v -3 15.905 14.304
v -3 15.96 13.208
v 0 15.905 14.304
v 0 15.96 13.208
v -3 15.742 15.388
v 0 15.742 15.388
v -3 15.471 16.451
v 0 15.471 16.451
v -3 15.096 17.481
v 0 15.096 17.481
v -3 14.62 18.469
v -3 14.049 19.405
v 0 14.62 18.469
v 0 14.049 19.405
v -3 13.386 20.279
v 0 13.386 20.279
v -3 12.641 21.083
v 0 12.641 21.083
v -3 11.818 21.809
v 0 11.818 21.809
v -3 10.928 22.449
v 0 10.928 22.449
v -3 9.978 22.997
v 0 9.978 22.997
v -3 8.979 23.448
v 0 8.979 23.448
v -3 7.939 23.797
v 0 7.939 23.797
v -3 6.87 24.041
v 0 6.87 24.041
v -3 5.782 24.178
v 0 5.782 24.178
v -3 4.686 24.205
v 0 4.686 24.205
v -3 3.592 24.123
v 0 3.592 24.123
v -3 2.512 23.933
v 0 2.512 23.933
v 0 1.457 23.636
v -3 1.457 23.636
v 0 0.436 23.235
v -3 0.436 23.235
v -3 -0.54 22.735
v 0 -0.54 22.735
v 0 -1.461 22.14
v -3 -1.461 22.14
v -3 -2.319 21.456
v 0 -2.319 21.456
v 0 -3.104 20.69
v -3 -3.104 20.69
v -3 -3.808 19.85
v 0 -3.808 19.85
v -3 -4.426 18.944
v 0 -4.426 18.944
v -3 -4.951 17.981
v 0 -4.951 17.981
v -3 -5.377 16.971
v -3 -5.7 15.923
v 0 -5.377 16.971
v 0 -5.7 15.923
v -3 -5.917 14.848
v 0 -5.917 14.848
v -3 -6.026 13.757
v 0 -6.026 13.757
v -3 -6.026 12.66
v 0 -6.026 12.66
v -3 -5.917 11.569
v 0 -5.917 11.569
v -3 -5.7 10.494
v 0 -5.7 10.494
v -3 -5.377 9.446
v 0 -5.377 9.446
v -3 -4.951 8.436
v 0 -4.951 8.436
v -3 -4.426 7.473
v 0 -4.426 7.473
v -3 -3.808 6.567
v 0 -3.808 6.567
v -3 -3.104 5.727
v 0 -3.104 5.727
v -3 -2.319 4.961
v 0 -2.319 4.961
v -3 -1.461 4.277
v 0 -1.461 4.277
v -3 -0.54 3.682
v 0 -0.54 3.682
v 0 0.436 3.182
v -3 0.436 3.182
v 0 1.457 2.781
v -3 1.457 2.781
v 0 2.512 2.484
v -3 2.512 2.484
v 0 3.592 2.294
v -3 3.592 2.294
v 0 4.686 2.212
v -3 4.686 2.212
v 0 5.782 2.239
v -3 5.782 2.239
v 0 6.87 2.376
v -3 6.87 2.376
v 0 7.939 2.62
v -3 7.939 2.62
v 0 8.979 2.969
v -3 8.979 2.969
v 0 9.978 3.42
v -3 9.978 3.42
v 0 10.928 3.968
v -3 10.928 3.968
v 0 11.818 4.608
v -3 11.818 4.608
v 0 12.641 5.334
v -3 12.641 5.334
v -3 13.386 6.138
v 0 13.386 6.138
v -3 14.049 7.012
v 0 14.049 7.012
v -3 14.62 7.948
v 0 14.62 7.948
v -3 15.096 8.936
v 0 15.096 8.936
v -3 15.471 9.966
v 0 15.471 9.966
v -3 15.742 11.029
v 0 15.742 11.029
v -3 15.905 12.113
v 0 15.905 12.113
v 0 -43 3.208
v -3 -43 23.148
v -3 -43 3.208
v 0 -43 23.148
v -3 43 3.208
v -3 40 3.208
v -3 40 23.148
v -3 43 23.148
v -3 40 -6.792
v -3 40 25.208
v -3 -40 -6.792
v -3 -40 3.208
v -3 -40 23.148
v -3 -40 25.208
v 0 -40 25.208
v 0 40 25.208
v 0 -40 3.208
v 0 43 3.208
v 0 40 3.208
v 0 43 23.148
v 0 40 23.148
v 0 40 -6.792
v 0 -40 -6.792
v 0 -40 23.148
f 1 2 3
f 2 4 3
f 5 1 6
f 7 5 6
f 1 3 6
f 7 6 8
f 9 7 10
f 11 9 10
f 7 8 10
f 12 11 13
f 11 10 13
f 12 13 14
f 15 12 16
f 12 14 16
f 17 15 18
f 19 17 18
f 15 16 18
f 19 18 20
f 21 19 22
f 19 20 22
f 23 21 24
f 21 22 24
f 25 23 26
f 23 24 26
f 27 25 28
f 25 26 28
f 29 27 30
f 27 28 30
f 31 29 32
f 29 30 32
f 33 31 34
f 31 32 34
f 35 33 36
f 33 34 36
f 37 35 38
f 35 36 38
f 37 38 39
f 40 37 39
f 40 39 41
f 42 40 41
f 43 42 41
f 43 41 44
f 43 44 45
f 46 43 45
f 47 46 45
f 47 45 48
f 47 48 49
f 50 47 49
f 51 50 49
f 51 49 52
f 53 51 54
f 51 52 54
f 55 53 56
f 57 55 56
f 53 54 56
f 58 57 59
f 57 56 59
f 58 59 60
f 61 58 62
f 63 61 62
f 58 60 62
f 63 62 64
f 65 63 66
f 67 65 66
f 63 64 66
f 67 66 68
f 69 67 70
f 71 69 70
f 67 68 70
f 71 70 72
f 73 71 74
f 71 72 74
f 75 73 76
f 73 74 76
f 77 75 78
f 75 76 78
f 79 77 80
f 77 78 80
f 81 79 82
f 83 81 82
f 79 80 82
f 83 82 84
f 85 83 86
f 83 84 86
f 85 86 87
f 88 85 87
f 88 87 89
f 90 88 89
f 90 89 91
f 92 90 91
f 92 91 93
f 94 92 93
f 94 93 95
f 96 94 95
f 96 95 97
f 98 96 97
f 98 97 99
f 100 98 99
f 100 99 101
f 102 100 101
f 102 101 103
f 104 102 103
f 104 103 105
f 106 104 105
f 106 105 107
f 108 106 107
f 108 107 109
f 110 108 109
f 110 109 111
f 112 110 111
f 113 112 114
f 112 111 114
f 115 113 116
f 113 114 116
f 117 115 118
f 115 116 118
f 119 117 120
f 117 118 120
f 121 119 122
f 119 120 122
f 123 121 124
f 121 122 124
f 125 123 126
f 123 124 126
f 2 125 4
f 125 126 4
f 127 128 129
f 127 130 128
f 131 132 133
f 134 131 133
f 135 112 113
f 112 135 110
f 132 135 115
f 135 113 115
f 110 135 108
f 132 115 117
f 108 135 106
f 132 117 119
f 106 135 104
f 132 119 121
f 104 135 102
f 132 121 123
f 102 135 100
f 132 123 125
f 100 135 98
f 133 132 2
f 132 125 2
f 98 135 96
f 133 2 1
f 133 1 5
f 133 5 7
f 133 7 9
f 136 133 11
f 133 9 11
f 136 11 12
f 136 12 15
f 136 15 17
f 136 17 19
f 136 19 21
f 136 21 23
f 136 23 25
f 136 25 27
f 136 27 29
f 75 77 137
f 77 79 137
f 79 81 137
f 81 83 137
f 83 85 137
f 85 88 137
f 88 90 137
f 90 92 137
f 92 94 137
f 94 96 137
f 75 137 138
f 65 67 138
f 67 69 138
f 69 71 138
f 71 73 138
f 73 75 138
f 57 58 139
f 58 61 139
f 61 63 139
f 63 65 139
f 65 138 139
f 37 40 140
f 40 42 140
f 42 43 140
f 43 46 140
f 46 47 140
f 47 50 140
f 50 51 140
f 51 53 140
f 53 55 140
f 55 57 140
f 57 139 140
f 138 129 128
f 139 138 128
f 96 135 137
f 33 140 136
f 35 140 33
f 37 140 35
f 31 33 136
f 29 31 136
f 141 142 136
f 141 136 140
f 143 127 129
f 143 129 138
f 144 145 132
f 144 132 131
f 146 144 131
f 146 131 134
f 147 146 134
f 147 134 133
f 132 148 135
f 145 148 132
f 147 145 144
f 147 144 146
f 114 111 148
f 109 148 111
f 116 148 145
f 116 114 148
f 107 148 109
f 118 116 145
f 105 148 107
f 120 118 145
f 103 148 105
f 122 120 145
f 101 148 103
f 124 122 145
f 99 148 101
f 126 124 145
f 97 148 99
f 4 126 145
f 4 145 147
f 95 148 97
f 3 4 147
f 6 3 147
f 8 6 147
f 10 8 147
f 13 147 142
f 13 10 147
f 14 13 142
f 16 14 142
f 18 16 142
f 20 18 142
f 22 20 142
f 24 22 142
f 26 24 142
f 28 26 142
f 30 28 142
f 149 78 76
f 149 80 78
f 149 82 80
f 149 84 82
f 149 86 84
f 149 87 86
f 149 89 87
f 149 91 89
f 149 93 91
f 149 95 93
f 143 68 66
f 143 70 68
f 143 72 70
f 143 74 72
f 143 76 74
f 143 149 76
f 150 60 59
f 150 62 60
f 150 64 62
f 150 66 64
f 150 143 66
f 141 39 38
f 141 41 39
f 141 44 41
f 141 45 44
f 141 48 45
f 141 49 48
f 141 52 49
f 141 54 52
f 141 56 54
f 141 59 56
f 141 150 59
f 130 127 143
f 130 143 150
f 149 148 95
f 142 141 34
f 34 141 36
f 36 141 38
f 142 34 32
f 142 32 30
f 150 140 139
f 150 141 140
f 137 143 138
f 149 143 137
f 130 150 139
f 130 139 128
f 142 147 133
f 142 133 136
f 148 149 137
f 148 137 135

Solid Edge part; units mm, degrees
sketch "Sketch1" plane through (0, 0, 0) normal (1, 0, 0) x (0, 1, 0)
  circle A0 centre (4.96, 13.2085) radius 11
  line L0 (40, -6.7915) -> (40, 3.2085)
  line L1 (40, 3.2085) -> (43, 3.2085)
  line L2 (43, 3.2085) -> (43, 23.1485)
  line L3 (43, 23.1485) -> (40, 23.1485)
  line L4 (40, 23.1485) -> (40, 25.2085)
  line L5 (40, 25.2085) -> (-40, 25.2085)
  line L6 (-40, 25.2085) -> (-40, 23.1485)
  line L7 (-40, 23.1485) -> (-43, 23.1485)
  line L8 (-43, 23.1485) -> (-43, 3.2085)
  line L9 (-43, 3.2085) -> (-40, 3.2085)
  line L10 (-40, 3.2085) -> (-40, -6.7915)
  line L11 (-40, -6.7915) -> (40, -6.7915)
  dimension "D1" = 22
  dimension "D2" = 19.94
  dimension "D3" = 80
  dimension "D4" = 3
  dimension "D5" = 10
  dimension "D6" = 47.96
  dimension "D7" = 10
  dimension "D8" = 1
extrude "Protrusion1" add sketch "Sketch1" against normal blind 3
properties material "Acier"
